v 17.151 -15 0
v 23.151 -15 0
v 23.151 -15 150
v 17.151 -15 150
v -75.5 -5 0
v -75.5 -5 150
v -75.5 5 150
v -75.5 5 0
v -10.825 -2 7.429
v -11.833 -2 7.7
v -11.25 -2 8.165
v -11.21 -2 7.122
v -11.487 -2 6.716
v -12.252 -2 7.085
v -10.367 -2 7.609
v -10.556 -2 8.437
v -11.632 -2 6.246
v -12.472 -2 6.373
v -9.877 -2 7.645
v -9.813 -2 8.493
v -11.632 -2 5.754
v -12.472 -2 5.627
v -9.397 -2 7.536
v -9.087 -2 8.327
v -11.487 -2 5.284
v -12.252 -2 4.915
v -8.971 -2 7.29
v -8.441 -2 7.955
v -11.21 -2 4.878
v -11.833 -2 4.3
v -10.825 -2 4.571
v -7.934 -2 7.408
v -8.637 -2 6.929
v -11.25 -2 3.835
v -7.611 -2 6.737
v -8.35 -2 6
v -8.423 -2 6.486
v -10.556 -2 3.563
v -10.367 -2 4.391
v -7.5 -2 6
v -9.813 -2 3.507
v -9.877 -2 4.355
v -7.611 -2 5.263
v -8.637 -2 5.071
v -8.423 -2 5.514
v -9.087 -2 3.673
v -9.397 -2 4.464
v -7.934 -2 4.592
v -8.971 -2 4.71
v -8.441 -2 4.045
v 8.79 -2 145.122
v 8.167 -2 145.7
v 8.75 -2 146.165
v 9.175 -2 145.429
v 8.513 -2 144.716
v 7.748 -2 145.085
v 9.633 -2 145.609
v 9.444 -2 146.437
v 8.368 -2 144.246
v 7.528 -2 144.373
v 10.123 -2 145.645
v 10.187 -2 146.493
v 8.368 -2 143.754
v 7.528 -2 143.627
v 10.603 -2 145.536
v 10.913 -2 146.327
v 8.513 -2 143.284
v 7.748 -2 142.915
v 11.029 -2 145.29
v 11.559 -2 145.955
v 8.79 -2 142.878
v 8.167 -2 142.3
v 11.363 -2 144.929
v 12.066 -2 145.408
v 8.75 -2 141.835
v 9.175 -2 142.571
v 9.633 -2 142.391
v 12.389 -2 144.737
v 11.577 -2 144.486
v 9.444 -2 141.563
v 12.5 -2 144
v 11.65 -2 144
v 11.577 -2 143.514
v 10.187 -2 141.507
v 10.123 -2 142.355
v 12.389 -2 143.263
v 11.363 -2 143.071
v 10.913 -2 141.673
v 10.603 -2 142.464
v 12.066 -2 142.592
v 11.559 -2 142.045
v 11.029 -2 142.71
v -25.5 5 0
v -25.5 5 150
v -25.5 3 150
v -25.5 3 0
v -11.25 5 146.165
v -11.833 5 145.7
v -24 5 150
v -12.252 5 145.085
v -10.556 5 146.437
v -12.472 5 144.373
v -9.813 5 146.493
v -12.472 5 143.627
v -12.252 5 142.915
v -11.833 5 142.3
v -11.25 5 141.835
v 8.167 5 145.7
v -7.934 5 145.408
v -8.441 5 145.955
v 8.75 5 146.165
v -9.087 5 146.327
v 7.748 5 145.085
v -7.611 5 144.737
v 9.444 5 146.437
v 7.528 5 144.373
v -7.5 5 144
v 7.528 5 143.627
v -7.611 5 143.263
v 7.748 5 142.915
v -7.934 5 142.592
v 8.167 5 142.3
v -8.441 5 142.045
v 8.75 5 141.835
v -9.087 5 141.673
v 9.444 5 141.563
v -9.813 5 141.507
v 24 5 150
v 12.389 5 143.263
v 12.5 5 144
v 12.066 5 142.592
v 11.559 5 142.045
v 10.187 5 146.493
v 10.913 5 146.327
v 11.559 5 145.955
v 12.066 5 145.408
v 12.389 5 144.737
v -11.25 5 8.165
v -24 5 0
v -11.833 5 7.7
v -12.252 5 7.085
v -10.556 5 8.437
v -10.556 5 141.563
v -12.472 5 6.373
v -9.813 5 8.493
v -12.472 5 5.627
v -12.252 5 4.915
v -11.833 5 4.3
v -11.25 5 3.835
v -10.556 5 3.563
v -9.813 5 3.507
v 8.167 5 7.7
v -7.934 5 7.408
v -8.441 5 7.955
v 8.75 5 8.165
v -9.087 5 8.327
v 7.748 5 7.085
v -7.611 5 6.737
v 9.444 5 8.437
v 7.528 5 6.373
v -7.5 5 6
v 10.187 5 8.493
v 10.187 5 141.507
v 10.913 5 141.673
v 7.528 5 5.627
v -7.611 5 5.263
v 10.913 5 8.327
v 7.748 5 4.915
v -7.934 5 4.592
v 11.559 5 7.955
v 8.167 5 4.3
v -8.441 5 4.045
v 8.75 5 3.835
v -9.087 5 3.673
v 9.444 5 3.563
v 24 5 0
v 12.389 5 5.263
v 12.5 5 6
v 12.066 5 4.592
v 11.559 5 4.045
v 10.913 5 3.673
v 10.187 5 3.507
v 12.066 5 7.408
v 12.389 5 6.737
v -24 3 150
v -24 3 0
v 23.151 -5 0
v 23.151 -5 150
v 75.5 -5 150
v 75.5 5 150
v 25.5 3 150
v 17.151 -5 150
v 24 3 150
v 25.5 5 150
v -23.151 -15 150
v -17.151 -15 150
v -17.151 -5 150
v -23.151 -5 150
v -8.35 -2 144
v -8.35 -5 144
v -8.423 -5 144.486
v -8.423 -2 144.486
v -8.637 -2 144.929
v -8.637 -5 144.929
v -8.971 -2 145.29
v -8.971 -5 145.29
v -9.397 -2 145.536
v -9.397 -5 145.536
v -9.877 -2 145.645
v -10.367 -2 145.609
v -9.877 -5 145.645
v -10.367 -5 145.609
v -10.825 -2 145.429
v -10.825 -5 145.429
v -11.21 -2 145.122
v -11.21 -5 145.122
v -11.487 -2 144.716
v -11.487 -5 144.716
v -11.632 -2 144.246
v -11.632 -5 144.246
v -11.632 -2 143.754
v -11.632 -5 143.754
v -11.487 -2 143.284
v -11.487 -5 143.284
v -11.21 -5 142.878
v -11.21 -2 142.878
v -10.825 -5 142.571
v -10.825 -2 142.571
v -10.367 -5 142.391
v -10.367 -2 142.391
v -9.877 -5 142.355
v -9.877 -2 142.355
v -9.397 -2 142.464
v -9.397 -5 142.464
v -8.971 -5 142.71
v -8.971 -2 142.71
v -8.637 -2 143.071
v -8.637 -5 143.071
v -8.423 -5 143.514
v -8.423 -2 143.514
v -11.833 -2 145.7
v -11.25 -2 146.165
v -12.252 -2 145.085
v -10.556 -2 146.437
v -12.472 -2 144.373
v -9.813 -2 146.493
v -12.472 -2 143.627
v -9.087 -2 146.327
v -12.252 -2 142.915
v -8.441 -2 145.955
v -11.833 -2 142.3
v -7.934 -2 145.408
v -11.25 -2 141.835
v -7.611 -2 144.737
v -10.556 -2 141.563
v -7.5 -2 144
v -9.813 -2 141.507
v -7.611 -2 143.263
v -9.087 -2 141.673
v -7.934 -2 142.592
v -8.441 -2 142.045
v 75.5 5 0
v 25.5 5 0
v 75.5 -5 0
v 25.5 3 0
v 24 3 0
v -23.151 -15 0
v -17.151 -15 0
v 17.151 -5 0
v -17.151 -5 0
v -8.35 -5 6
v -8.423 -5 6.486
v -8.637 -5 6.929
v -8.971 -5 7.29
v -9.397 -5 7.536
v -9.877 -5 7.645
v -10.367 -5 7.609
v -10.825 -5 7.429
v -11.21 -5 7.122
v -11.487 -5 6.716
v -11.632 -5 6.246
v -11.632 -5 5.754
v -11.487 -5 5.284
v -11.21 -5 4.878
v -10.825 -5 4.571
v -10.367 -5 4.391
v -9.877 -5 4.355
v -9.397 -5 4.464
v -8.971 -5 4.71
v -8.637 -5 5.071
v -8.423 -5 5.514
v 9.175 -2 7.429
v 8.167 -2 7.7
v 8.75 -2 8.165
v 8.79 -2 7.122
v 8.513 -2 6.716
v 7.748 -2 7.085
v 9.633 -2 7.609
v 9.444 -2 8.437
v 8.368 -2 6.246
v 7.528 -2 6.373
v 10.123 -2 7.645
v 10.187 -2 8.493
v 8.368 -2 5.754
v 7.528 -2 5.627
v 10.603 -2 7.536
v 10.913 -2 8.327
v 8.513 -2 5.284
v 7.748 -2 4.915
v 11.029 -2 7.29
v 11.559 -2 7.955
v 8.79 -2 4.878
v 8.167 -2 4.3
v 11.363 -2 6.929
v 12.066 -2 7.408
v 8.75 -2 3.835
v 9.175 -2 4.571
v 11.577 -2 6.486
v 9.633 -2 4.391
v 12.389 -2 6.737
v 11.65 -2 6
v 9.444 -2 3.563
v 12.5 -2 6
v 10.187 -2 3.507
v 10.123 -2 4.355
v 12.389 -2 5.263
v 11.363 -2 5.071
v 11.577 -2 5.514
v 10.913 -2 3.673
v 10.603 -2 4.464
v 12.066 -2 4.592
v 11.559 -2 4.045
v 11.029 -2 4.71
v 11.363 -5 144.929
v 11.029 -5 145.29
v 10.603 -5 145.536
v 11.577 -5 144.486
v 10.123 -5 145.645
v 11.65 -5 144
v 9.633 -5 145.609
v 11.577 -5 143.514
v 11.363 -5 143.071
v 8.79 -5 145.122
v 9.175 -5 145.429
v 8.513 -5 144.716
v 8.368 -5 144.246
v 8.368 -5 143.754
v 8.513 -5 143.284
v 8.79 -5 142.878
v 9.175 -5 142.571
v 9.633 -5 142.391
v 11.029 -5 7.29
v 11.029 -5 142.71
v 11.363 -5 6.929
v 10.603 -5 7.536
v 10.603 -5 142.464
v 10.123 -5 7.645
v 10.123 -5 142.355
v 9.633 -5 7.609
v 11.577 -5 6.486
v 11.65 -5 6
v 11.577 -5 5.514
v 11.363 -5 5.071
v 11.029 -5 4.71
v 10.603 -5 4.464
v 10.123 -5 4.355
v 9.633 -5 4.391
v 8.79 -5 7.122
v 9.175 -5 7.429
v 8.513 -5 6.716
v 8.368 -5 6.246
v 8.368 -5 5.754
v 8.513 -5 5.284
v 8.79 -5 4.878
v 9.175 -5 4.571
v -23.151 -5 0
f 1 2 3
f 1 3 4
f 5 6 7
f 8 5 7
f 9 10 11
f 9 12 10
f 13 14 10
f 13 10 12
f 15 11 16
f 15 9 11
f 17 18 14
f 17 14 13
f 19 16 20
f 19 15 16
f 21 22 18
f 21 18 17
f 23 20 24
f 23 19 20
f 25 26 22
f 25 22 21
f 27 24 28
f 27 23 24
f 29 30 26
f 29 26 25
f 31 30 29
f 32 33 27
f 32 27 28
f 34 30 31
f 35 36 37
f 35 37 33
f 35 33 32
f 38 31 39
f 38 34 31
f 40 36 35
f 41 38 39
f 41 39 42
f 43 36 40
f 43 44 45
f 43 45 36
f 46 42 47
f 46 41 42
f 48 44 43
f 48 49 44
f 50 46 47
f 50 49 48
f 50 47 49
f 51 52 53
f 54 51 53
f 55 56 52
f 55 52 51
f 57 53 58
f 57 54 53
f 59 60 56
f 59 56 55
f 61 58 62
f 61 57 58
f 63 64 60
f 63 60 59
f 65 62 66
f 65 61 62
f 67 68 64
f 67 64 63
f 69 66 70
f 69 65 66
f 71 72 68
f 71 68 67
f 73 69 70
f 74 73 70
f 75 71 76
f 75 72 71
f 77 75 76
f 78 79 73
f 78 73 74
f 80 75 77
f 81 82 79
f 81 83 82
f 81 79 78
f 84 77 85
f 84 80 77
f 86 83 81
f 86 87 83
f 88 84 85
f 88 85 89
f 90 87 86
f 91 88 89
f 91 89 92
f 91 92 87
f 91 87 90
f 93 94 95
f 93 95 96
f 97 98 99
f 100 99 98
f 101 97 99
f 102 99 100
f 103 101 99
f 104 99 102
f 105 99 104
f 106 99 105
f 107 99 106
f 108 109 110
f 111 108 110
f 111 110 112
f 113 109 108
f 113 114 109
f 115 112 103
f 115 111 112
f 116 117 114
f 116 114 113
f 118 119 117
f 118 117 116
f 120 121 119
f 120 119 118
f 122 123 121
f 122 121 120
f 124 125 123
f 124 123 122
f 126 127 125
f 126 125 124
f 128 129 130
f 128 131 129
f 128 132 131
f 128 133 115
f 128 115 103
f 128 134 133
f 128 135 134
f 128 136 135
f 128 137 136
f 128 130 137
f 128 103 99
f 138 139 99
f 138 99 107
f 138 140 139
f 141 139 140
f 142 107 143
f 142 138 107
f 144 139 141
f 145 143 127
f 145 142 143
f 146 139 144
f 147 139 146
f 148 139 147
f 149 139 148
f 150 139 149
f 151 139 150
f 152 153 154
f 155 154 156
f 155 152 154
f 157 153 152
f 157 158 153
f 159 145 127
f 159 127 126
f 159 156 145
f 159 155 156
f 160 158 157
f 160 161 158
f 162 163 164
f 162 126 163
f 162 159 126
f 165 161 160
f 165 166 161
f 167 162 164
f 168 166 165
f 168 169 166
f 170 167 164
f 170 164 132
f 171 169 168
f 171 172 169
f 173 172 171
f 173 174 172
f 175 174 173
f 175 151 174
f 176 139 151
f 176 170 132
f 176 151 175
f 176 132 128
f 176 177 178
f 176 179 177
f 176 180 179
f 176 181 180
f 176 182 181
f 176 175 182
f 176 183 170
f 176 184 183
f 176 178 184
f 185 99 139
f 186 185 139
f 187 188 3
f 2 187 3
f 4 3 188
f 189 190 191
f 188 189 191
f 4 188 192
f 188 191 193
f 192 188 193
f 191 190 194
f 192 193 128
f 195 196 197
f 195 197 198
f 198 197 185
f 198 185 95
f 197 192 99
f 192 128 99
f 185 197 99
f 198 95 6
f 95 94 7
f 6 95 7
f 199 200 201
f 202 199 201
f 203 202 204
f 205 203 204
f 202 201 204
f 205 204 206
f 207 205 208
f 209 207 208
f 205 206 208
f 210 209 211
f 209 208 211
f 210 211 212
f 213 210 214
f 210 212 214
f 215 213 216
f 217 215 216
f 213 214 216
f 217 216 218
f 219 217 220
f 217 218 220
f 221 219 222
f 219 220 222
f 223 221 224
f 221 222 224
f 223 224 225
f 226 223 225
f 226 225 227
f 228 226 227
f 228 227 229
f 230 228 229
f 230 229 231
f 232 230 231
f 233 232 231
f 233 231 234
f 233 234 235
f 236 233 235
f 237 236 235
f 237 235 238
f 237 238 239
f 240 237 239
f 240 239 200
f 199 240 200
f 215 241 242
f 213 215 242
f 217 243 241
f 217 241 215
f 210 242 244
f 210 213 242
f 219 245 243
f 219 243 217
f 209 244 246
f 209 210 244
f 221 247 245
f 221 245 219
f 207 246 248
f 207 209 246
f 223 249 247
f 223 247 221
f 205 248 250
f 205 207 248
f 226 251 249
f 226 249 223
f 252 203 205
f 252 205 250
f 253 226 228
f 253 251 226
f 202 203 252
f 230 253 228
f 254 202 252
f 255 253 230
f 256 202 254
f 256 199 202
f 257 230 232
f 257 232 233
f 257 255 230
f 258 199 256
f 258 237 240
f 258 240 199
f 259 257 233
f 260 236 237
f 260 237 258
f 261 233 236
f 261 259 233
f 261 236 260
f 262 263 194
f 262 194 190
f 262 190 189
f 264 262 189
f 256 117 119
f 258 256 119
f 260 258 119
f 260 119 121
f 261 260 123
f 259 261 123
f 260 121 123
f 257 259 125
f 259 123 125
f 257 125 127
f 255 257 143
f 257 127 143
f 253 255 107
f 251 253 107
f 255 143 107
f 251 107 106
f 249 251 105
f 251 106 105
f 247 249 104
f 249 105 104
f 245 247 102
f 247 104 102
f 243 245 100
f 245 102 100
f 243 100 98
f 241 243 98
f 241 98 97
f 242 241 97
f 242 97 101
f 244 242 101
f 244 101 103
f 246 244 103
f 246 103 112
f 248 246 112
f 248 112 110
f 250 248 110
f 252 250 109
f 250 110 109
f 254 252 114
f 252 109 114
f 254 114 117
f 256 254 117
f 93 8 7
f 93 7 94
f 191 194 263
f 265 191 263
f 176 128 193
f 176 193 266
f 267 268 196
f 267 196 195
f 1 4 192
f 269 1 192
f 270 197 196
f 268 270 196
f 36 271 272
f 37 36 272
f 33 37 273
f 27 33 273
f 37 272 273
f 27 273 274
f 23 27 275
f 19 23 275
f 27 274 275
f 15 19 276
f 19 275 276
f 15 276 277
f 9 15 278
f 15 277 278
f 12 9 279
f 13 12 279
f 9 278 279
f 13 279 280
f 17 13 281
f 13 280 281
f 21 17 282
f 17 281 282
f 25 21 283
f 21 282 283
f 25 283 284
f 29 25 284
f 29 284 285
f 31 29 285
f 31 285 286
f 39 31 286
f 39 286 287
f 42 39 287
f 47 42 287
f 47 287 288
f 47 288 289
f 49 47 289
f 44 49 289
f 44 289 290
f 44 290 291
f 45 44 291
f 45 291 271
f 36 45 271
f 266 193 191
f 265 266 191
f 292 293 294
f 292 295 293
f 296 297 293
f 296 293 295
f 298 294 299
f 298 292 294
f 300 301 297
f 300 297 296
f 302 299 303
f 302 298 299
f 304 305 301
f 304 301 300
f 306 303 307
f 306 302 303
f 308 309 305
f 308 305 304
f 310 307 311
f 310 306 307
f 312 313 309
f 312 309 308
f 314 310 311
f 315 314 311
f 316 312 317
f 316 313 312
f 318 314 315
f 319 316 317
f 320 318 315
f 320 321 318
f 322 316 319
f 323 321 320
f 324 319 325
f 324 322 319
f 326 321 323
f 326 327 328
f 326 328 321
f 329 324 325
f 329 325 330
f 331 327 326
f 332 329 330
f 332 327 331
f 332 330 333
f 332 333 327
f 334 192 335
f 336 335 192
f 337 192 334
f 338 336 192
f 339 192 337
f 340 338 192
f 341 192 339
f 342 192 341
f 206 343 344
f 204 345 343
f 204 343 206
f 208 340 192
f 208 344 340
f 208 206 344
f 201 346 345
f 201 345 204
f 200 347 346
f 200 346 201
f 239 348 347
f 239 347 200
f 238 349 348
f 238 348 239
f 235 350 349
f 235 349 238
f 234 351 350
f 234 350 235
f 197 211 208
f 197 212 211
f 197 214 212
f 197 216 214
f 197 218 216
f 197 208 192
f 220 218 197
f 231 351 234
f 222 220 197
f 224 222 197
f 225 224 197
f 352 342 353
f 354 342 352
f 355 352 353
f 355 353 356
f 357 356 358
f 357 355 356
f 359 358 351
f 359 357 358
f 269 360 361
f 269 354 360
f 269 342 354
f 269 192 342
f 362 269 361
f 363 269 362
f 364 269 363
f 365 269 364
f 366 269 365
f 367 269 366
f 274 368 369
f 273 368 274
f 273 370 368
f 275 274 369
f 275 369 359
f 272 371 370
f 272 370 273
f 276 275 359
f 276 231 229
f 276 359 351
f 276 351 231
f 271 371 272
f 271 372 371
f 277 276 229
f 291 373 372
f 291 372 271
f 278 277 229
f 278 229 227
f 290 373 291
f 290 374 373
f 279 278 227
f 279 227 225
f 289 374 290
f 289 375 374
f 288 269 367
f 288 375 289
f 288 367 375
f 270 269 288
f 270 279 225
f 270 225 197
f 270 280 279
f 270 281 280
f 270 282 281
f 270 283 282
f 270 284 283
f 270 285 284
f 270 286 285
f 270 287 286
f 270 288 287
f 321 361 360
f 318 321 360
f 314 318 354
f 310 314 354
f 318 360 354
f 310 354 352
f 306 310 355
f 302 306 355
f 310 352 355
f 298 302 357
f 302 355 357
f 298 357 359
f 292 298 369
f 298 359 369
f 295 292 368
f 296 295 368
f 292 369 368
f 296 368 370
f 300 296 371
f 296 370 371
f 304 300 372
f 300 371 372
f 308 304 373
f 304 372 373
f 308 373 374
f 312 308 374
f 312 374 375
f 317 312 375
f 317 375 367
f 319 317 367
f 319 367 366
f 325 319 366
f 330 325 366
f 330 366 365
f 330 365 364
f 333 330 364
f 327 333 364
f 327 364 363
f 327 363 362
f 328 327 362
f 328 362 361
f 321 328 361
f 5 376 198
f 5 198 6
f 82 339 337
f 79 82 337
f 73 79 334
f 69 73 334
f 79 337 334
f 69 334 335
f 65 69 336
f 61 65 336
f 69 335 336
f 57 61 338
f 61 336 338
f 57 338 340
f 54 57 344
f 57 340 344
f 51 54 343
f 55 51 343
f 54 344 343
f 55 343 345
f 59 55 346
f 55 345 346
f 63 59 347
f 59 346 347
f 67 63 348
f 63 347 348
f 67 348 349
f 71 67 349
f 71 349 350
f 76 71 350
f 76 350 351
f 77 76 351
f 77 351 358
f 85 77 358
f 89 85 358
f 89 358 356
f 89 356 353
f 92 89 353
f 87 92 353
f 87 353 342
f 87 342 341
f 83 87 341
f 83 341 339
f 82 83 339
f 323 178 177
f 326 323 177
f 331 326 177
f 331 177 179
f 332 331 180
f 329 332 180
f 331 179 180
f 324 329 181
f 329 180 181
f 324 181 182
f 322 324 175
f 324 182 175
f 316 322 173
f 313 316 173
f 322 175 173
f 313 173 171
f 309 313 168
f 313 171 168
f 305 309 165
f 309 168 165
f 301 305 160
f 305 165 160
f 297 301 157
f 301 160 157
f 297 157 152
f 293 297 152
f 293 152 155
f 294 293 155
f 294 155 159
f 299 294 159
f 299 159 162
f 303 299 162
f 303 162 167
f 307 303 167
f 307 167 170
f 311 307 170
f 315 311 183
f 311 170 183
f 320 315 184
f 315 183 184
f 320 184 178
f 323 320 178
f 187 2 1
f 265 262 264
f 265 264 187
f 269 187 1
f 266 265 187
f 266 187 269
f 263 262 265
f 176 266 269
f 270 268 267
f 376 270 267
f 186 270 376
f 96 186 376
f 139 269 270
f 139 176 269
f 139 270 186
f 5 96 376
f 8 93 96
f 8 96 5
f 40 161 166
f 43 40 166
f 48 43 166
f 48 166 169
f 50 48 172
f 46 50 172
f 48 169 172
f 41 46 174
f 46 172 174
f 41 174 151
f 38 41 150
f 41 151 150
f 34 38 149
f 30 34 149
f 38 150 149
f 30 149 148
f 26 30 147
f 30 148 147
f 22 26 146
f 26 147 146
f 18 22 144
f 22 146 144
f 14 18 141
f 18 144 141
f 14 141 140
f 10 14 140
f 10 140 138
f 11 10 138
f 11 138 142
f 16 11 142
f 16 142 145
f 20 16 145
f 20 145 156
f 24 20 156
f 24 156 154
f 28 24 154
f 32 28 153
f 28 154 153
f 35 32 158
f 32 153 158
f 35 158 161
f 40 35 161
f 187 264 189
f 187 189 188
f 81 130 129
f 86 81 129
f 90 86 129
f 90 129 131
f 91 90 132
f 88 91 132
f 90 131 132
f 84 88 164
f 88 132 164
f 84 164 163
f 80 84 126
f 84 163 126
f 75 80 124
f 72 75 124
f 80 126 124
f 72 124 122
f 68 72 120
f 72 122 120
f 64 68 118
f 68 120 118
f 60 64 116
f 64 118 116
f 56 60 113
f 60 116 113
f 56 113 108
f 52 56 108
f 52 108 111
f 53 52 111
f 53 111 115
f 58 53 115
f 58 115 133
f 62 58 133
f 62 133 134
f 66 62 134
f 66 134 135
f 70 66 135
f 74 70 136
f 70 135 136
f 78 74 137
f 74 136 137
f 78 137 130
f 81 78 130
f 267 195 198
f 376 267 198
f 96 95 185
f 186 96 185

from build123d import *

# Parameters (mm, degrees)
BOSS_EXTRUDE1_DEPTH = 150
SKETCH4_R           = 1.65
CUT_EXTRUDE1_DEPTH  = 10
SKETCH6_W           = 1.5
SKETCH6_H           = 150
CUT_EXTRUDE2_DEPTH  = 2
SKETCH7_R           = 2.5
CUT_EXTRUDE3_DEPTH  = 7


with BuildPart() as part:
    # Sketch1 → Boss-Extrude1 (new body)
    with BuildSketch(Plane.XY):
        Polygon((-75.5, 5), (75.5, 5), (75.5, -5), (23.151457837, -5), (23.151457837, -15), (17.151457837, -15), (17.151457837, -5), (-17.151457837, -5), (-17.151457837, -15), (-23.151457837, -15), (-23.151457837, -5), (-75.5, -5), align=None)
    extrude(amount=BOSS_EXTRUDE1_DEPTH)

    # Sketch4 → Cut-Extrude1 (cut)
    with BuildSketch(Plane.XZ.offset(5)):
        with Locations((-10, 6)):
            Circle(SKETCH4_R)
        with Locations((10, 6)):
            Circle(SKETCH4_R)
        with Locations((-10, 144)):
            Circle(SKETCH4_R)
        with Locations((10, 144)):
            Circle(SKETCH4_R)
    extrude(amount=-CUT_EXTRUDE1_DEPTH, mode=Mode.SUBTRACT)

    # Sketch6 → Cut-Extrude2 (cut)
    with BuildSketch(Plane(origin=(0, 5, 0), x_dir=(1, 0, 0), z_dir=(0, 1, 0))):
        with Locations((-24.75, -75)):
            Rectangle(SKETCH6_W, SKETCH6_H)
        with Locations((24.75, -75)):
            Rectangle(SKETCH6_W, SKETCH6_H)
    extrude(amount=-CUT_EXTRUDE2_DEPTH, mode=Mode.SUBTRACT)

    # Sketch7 → Cut-Extrude3 (cut)
    with BuildSketch(Plane(origin=(0, 5, 0), x_dir=(1, 0, 0), z_dir=(0, 1, 0))):
        with Locations((-10, -144)):
            Circle(SKETCH7_R)
        with Locations((10, -144)):
            Circle(SKETCH7_R)
        with Locations((10, -6)):
            Circle(SKETCH7_R)
        with Locations((-10, -6)):
            Circle(SKETCH7_R)
    extrude(amount=-CUT_EXTRUDE3_DEPTH, mode=Mode.SUBTRACT)


solid = part.part
